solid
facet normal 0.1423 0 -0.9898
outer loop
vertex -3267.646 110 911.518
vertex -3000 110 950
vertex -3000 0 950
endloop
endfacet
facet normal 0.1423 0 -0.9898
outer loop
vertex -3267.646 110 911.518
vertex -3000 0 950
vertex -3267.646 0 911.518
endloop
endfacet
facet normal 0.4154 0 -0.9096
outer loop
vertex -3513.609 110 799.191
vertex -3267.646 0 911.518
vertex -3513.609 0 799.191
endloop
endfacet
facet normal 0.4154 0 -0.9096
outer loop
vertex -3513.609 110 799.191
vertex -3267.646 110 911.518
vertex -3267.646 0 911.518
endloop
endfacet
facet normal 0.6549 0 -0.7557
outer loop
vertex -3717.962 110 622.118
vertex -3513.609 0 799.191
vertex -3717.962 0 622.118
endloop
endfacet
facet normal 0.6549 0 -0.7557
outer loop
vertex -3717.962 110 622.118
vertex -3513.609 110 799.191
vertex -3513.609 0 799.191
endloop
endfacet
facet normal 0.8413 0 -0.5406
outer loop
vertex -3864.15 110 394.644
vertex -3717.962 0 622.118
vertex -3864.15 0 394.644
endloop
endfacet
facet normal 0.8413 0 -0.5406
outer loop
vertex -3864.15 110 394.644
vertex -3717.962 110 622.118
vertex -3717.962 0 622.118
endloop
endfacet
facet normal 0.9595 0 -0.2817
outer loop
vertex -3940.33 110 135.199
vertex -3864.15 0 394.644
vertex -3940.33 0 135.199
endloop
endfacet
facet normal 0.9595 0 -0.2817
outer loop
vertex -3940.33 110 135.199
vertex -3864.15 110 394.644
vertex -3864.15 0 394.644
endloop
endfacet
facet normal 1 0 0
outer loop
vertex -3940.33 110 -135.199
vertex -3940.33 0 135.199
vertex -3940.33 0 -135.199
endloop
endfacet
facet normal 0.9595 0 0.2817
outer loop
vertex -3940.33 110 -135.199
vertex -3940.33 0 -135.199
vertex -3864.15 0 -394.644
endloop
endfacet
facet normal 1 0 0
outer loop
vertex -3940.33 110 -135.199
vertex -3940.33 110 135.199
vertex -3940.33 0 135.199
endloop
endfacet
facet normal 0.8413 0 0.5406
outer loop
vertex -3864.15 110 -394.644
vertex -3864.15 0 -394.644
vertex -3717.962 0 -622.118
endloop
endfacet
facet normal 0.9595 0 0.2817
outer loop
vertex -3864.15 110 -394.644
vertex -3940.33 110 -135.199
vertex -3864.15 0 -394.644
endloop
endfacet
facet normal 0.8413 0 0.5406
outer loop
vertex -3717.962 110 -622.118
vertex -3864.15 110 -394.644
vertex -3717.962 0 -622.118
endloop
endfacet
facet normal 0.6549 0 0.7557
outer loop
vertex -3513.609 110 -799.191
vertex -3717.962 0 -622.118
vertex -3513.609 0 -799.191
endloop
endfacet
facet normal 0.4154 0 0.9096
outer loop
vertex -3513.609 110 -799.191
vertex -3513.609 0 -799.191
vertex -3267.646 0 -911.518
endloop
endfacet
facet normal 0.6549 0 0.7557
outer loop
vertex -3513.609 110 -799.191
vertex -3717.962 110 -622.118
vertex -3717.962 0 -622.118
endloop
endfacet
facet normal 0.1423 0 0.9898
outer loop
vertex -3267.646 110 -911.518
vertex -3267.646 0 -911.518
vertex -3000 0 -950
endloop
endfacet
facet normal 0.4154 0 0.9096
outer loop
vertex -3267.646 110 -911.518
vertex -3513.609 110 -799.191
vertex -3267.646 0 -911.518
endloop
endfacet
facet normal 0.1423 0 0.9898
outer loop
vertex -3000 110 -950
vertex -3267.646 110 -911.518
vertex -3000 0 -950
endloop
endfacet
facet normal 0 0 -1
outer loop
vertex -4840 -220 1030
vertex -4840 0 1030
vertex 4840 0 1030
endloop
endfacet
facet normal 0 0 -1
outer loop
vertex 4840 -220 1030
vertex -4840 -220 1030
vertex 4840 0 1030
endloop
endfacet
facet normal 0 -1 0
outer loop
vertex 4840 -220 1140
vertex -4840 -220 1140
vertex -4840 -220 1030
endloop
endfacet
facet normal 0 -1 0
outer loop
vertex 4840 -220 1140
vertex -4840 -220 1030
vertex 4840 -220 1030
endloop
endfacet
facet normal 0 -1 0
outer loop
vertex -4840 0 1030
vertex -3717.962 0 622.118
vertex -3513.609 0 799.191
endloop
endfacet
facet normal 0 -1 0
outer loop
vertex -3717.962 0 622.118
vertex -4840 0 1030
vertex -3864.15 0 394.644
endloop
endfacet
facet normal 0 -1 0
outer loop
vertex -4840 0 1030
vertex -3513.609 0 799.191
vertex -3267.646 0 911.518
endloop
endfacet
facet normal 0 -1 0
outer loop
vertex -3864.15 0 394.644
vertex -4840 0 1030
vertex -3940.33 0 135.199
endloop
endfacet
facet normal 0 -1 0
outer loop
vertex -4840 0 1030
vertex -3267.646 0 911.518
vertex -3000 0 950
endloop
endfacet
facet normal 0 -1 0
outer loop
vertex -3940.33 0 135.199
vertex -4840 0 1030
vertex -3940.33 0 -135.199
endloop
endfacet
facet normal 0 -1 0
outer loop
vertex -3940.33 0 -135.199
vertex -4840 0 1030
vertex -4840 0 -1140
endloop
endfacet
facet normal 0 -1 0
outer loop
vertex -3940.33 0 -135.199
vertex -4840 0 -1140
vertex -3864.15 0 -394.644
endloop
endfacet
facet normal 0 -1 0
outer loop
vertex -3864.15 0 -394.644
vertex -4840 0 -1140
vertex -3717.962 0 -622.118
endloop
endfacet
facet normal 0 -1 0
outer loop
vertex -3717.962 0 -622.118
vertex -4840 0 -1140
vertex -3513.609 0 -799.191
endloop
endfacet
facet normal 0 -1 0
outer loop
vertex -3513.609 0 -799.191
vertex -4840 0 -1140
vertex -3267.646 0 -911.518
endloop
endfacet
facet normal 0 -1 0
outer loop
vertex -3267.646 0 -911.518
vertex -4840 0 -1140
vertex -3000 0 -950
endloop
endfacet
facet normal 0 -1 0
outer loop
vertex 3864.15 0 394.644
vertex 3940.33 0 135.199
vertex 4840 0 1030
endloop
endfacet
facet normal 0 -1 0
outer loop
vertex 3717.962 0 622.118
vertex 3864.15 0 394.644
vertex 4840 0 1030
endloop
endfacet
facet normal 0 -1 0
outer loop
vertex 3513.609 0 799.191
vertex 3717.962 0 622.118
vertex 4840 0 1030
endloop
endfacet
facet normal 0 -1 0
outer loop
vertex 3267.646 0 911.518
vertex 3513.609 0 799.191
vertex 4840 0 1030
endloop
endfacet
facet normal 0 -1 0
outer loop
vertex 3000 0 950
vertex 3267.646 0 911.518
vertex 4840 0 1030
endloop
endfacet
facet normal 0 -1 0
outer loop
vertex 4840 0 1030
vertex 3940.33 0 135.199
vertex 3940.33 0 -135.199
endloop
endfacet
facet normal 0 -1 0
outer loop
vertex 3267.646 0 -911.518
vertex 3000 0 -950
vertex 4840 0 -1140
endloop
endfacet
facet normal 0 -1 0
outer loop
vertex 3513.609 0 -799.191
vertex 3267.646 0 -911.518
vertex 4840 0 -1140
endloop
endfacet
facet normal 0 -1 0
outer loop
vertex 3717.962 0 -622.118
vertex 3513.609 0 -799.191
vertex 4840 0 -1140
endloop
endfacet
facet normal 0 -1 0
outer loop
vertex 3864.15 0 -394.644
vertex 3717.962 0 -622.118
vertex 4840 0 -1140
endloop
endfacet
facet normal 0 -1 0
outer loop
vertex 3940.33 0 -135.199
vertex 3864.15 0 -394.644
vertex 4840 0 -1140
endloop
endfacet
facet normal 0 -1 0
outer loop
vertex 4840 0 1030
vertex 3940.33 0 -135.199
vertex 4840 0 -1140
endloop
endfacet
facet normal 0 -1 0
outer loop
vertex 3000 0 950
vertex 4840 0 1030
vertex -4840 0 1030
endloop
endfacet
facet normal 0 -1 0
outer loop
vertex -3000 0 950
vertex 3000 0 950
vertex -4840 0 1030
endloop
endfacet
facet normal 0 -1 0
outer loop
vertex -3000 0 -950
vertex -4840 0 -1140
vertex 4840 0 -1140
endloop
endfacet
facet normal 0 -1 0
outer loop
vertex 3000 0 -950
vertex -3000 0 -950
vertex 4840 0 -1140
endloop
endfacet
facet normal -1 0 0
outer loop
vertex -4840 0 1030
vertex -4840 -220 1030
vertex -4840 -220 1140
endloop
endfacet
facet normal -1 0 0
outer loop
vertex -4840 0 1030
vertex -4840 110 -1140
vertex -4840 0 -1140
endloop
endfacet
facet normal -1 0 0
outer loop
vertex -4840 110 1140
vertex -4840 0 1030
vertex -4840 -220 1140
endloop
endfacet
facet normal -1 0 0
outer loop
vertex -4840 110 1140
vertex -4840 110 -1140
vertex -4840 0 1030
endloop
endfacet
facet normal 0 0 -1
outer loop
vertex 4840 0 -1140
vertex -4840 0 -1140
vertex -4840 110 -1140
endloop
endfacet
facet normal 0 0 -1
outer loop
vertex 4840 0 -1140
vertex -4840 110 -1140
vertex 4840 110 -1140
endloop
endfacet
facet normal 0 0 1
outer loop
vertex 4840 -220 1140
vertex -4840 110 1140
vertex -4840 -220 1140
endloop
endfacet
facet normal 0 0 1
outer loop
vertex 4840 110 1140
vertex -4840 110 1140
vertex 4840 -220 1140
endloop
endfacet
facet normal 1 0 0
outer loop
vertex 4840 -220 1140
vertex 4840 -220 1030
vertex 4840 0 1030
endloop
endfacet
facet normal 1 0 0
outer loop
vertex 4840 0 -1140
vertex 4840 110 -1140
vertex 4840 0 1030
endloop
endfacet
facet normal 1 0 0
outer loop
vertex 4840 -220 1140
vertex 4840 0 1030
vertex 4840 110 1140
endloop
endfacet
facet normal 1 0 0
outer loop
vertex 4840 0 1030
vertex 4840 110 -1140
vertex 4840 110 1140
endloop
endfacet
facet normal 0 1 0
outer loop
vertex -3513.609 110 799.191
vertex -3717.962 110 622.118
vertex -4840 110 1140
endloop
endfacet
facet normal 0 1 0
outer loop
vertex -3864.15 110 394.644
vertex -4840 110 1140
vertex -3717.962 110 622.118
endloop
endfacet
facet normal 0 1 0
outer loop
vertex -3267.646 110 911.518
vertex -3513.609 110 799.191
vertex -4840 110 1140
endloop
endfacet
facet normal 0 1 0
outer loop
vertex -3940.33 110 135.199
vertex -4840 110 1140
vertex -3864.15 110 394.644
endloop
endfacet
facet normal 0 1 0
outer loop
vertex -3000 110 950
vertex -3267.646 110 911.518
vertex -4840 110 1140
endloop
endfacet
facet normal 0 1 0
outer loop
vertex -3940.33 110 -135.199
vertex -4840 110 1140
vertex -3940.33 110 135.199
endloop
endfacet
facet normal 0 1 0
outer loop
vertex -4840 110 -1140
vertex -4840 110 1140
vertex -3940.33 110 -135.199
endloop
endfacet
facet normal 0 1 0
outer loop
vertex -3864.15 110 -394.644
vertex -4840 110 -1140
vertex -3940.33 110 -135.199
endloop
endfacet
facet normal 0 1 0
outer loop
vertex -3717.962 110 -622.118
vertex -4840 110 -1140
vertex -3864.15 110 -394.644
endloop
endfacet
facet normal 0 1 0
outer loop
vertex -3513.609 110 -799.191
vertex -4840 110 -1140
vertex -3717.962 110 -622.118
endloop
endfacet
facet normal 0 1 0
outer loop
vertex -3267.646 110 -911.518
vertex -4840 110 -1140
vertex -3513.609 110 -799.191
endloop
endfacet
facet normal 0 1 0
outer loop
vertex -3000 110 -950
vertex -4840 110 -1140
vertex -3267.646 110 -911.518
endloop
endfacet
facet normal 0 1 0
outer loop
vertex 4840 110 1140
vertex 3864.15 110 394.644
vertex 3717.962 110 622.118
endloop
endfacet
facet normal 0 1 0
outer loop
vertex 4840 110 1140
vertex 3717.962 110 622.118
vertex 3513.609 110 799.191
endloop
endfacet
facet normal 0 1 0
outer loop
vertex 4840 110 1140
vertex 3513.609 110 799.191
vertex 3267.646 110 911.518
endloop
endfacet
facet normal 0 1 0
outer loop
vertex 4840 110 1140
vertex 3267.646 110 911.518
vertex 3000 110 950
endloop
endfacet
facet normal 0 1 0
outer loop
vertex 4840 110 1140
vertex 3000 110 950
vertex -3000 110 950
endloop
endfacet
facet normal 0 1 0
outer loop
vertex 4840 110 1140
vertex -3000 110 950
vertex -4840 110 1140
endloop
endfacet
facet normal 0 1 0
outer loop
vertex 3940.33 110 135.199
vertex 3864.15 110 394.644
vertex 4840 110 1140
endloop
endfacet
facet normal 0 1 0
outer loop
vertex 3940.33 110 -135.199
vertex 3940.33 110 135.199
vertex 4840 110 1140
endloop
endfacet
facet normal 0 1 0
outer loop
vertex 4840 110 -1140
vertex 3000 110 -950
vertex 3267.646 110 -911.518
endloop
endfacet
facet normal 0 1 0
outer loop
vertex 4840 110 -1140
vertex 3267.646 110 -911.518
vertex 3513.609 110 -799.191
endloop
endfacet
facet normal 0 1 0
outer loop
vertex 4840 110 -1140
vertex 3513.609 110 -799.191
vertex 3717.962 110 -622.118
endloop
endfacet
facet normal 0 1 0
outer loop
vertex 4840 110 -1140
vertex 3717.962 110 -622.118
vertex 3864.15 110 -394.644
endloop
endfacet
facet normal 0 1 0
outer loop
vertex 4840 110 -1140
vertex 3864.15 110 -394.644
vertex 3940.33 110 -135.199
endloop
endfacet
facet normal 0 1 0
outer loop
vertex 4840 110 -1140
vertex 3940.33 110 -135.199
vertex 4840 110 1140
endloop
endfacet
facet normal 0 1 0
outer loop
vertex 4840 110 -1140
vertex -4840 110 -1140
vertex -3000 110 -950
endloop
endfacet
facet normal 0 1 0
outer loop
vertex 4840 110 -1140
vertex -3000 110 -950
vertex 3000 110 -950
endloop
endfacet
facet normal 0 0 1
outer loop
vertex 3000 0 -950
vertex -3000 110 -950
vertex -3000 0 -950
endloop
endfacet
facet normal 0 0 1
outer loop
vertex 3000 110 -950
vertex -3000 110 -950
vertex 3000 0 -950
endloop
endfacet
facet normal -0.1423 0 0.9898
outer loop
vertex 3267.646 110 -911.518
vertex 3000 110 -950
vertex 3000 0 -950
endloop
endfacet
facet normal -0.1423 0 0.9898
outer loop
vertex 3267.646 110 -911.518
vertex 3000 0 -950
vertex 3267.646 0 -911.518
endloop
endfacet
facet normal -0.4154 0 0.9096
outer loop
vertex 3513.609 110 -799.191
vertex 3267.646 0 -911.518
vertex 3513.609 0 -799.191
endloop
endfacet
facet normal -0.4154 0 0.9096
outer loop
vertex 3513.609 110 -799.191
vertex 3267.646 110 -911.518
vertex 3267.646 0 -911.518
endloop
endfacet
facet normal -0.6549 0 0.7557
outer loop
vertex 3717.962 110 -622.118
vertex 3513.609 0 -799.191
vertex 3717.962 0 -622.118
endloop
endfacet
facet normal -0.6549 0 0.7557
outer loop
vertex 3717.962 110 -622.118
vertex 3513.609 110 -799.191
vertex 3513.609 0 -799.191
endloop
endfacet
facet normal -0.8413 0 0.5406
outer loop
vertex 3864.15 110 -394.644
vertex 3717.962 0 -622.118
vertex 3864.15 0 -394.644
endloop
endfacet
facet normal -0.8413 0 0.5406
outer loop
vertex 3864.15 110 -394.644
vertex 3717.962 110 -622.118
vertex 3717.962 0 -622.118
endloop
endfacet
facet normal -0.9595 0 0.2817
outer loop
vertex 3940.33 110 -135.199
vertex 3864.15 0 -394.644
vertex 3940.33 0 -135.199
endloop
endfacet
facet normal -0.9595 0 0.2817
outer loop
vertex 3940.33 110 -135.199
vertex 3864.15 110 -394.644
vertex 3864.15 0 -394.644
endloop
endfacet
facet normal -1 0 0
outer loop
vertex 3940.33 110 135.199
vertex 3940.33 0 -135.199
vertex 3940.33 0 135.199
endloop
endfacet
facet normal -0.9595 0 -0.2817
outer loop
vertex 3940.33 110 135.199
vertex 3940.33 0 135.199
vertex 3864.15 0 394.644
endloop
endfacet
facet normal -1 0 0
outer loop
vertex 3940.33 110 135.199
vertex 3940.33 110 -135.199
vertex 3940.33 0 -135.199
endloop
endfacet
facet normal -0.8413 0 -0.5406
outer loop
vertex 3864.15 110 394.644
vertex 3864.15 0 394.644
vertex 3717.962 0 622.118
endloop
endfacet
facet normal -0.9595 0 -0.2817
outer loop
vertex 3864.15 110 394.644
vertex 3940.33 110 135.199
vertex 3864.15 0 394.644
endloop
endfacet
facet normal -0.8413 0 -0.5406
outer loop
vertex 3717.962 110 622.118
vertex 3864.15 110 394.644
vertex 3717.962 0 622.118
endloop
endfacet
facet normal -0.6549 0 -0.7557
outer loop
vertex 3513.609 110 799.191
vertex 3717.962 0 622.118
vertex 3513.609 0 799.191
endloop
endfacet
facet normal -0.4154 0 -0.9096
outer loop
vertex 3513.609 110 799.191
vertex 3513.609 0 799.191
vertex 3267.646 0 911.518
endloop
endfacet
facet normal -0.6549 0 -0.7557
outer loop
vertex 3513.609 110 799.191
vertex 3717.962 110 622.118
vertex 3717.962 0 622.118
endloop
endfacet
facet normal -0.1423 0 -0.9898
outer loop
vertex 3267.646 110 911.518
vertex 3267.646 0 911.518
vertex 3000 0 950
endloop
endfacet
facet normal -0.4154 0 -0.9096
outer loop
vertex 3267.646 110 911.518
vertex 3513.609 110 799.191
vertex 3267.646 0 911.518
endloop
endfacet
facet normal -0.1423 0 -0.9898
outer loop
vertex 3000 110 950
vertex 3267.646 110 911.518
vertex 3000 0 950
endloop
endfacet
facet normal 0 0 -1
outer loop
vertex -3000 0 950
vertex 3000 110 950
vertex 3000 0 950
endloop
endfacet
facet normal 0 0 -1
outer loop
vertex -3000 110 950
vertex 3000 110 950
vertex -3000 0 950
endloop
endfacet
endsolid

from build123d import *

# Parameters (mm, degrees)
SKETCH1_W           = 9680
SKETCH1_H           = 2280
BOSS_EXTRUDE1_DEPTH = 110
CUT_EXTRUDE1_DEPTH  = 110
SKETCH4_W           = 9680
SKETCH4_H           = 110
BOSS_EXTRUDE3_DEPTH = 220


with BuildPart() as part:
    # Sketch1 → Boss-Extrude1 (new body)
    with BuildSketch(Plane(origin=(0, 0, 0), x_dir=(1, 0, 0), z_dir=(0, 1, 0))):
        Rectangle(SKETCH1_W, SKETCH1_H)
    extrude(amount=BOSS_EXTRUDE1_DEPTH)

    # Sketch2 → Cut-Extrude1 (cut)
    with BuildSketch(Plane(origin=(0, 110, 0), x_dir=(1, 0, 0), z_dir=(0, 1, 0))):
        with BuildLine():
            Line((-3000, 950), (3000, 950))
            ThreePointArc((3000, 950), (3950, 0), (3000, -950))
            Line((3000, -950), (-3000, -950))
            ThreePointArc((-3000, -950), (-3950, 0), (-3000, 950))
        make_face()
    extrude(amount=-CUT_EXTRUDE1_DEPTH, mode=Mode.SUBTRACT)

    # Sketch4 → Boss-Extrude3 (add)
    with BuildSketch(Plane.XZ):
        with Locations((0, 1085)):
            Rectangle(SKETCH4_W, SKETCH4_H)
    extrude(amount=BOSS_EXTRUDE3_DEPTH)


solid = part.part
